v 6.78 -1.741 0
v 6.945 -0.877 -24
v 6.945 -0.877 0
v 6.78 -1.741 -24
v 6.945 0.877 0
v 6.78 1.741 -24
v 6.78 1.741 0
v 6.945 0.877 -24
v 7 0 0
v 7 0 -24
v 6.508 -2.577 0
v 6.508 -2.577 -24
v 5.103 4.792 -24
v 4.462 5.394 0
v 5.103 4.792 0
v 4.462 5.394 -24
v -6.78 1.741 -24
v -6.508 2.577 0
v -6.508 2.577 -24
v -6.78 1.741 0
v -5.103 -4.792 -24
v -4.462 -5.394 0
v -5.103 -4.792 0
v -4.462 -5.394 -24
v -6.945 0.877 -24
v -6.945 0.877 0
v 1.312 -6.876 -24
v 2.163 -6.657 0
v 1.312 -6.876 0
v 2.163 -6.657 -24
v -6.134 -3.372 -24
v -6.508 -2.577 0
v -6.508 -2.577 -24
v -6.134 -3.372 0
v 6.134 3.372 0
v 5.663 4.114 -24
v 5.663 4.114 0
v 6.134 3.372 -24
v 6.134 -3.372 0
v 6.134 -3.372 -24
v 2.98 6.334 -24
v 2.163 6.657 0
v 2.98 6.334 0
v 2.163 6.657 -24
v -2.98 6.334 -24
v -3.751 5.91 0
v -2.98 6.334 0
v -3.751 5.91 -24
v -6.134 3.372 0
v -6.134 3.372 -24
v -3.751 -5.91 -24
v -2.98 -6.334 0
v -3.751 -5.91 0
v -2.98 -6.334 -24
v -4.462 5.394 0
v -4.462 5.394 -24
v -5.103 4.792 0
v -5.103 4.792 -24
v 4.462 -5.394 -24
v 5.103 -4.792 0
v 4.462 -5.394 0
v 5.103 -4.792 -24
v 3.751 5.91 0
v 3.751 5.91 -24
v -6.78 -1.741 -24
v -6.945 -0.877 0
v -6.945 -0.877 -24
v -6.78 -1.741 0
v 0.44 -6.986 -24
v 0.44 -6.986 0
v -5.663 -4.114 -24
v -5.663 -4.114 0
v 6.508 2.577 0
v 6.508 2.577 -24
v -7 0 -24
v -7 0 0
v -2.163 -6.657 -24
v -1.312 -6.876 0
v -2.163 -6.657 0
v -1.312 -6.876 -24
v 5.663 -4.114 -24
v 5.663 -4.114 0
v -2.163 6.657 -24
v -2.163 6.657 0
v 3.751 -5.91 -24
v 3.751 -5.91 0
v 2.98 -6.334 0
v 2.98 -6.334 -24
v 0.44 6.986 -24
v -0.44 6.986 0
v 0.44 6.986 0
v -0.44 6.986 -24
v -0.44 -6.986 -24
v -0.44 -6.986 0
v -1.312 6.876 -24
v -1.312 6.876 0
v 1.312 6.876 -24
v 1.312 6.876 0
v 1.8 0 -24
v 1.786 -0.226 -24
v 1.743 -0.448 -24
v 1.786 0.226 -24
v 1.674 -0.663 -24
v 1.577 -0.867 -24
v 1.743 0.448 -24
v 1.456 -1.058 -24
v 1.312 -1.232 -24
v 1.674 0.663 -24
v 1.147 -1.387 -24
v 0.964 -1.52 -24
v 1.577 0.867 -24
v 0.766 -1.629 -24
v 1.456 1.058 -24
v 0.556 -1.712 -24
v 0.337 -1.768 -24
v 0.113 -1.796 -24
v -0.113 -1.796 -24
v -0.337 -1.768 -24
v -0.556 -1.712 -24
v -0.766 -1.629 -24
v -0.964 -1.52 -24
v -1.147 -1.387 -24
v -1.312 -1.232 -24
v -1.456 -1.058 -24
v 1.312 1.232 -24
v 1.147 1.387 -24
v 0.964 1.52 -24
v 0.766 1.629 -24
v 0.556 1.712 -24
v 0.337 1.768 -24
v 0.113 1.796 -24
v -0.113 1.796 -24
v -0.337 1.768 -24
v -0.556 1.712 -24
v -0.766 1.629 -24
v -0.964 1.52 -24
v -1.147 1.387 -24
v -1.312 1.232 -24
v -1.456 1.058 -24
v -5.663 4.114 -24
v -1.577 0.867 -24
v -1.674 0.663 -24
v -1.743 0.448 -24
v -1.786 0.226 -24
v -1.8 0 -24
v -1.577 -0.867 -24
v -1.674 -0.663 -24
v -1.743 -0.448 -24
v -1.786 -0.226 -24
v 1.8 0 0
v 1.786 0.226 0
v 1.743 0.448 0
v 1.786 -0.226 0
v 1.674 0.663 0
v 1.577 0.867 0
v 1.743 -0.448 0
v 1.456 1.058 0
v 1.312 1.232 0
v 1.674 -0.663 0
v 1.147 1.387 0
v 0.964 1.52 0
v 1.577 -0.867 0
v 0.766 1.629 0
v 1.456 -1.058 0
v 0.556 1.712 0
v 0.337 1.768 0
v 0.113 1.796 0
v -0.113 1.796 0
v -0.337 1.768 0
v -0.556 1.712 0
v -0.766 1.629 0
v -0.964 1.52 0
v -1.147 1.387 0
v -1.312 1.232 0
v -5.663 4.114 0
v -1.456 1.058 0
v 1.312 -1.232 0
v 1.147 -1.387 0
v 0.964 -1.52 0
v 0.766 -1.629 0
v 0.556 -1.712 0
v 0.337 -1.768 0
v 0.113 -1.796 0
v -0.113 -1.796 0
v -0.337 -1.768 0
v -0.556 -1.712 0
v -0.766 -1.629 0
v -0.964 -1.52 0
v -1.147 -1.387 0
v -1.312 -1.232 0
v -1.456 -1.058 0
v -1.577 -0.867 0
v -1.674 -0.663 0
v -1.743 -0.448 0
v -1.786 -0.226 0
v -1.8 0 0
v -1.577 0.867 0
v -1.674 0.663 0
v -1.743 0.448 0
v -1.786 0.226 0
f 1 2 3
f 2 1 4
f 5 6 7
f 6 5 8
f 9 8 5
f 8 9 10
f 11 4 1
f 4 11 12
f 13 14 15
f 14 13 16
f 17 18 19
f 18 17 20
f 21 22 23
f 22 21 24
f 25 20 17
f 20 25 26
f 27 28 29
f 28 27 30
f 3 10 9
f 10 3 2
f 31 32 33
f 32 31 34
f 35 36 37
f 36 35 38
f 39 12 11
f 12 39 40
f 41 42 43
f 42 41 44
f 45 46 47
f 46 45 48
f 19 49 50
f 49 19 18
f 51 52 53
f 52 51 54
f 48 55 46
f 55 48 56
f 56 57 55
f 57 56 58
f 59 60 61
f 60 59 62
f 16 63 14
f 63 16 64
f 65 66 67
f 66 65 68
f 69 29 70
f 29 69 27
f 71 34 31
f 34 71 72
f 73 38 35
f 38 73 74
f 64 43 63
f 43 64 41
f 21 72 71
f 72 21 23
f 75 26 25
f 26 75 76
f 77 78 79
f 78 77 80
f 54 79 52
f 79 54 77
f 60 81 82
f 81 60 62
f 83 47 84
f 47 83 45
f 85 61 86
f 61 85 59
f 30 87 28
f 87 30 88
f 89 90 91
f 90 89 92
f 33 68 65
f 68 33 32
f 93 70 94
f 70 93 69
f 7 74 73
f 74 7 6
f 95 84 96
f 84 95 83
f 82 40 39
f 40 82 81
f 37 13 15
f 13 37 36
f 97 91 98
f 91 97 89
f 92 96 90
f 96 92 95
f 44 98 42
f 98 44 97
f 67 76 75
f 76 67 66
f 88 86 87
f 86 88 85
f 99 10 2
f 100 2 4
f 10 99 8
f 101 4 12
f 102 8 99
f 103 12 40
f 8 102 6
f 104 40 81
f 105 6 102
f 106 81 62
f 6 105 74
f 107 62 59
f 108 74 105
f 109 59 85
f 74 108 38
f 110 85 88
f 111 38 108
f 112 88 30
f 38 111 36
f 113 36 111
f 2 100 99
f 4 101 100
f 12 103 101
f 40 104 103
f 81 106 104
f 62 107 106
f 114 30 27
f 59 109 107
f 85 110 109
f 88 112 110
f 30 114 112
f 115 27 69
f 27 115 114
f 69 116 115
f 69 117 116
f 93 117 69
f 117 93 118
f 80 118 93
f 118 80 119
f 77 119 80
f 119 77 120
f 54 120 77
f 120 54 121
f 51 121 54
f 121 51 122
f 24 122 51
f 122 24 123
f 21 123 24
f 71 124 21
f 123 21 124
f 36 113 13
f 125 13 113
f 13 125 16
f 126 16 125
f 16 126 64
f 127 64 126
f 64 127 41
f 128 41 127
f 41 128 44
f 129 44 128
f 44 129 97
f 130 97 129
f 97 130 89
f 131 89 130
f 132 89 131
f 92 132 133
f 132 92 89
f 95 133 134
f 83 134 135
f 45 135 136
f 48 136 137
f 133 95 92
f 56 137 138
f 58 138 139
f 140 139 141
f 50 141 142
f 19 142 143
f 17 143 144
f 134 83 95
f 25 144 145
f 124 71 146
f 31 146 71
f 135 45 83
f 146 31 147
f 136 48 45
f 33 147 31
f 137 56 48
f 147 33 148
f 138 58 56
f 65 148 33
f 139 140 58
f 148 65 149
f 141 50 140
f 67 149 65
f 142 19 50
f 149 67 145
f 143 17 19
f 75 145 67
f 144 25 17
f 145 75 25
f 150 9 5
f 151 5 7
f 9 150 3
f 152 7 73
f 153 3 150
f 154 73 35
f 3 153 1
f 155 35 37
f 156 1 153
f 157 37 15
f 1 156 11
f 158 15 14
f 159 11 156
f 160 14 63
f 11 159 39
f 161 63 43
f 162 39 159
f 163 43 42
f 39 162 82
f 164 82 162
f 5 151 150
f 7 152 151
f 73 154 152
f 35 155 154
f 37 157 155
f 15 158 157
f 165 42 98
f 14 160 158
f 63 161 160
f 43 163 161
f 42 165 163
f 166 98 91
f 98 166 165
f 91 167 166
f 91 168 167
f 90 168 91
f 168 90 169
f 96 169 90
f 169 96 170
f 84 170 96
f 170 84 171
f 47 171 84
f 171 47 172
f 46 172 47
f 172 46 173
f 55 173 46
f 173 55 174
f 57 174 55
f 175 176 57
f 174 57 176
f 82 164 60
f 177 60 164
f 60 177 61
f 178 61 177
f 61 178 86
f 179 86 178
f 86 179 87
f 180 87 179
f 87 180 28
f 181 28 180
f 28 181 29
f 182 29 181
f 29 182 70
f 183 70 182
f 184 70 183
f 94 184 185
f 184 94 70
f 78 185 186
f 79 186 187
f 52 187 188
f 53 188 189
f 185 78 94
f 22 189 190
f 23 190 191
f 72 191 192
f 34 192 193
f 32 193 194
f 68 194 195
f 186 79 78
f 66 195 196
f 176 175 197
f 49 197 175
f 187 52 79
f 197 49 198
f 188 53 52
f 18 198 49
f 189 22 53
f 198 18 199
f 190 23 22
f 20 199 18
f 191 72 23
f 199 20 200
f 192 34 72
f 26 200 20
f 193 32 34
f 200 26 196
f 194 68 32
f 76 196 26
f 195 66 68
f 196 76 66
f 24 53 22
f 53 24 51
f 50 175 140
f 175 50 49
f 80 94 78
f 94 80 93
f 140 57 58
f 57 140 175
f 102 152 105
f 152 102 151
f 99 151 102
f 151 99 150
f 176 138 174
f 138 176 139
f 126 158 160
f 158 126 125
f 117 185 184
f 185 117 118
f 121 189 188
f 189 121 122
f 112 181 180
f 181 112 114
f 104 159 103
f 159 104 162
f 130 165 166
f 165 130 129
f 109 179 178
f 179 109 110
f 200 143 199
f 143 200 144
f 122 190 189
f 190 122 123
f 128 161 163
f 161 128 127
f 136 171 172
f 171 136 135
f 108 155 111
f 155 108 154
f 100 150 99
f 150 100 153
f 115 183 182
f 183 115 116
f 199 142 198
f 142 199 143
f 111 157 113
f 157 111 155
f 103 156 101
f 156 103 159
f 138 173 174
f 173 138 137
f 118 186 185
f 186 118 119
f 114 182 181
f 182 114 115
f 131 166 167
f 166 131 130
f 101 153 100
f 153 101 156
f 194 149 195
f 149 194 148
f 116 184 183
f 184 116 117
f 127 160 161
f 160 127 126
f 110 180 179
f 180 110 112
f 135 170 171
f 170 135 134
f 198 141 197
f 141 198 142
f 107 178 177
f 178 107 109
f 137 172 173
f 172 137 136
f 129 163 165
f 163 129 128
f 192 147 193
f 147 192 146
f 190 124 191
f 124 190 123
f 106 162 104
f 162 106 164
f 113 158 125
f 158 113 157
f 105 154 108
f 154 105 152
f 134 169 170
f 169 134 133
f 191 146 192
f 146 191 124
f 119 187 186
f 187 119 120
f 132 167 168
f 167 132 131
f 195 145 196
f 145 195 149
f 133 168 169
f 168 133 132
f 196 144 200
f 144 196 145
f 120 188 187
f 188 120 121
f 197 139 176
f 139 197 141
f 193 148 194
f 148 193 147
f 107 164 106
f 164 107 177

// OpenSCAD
$fn = 50;


difference() {
	union() {
		translate(v = [0, 0, -24.0000000000]) {
			cylinder(h = 24, r = 7.0000000000);
		}
		cylinder(h = 0, r = 13.0000000000);
	}
	union() {
		#translate(v = [0, 0, -24]) {
			cylinder(h = 24, r = 1.8000000000);
		}
	}
}
